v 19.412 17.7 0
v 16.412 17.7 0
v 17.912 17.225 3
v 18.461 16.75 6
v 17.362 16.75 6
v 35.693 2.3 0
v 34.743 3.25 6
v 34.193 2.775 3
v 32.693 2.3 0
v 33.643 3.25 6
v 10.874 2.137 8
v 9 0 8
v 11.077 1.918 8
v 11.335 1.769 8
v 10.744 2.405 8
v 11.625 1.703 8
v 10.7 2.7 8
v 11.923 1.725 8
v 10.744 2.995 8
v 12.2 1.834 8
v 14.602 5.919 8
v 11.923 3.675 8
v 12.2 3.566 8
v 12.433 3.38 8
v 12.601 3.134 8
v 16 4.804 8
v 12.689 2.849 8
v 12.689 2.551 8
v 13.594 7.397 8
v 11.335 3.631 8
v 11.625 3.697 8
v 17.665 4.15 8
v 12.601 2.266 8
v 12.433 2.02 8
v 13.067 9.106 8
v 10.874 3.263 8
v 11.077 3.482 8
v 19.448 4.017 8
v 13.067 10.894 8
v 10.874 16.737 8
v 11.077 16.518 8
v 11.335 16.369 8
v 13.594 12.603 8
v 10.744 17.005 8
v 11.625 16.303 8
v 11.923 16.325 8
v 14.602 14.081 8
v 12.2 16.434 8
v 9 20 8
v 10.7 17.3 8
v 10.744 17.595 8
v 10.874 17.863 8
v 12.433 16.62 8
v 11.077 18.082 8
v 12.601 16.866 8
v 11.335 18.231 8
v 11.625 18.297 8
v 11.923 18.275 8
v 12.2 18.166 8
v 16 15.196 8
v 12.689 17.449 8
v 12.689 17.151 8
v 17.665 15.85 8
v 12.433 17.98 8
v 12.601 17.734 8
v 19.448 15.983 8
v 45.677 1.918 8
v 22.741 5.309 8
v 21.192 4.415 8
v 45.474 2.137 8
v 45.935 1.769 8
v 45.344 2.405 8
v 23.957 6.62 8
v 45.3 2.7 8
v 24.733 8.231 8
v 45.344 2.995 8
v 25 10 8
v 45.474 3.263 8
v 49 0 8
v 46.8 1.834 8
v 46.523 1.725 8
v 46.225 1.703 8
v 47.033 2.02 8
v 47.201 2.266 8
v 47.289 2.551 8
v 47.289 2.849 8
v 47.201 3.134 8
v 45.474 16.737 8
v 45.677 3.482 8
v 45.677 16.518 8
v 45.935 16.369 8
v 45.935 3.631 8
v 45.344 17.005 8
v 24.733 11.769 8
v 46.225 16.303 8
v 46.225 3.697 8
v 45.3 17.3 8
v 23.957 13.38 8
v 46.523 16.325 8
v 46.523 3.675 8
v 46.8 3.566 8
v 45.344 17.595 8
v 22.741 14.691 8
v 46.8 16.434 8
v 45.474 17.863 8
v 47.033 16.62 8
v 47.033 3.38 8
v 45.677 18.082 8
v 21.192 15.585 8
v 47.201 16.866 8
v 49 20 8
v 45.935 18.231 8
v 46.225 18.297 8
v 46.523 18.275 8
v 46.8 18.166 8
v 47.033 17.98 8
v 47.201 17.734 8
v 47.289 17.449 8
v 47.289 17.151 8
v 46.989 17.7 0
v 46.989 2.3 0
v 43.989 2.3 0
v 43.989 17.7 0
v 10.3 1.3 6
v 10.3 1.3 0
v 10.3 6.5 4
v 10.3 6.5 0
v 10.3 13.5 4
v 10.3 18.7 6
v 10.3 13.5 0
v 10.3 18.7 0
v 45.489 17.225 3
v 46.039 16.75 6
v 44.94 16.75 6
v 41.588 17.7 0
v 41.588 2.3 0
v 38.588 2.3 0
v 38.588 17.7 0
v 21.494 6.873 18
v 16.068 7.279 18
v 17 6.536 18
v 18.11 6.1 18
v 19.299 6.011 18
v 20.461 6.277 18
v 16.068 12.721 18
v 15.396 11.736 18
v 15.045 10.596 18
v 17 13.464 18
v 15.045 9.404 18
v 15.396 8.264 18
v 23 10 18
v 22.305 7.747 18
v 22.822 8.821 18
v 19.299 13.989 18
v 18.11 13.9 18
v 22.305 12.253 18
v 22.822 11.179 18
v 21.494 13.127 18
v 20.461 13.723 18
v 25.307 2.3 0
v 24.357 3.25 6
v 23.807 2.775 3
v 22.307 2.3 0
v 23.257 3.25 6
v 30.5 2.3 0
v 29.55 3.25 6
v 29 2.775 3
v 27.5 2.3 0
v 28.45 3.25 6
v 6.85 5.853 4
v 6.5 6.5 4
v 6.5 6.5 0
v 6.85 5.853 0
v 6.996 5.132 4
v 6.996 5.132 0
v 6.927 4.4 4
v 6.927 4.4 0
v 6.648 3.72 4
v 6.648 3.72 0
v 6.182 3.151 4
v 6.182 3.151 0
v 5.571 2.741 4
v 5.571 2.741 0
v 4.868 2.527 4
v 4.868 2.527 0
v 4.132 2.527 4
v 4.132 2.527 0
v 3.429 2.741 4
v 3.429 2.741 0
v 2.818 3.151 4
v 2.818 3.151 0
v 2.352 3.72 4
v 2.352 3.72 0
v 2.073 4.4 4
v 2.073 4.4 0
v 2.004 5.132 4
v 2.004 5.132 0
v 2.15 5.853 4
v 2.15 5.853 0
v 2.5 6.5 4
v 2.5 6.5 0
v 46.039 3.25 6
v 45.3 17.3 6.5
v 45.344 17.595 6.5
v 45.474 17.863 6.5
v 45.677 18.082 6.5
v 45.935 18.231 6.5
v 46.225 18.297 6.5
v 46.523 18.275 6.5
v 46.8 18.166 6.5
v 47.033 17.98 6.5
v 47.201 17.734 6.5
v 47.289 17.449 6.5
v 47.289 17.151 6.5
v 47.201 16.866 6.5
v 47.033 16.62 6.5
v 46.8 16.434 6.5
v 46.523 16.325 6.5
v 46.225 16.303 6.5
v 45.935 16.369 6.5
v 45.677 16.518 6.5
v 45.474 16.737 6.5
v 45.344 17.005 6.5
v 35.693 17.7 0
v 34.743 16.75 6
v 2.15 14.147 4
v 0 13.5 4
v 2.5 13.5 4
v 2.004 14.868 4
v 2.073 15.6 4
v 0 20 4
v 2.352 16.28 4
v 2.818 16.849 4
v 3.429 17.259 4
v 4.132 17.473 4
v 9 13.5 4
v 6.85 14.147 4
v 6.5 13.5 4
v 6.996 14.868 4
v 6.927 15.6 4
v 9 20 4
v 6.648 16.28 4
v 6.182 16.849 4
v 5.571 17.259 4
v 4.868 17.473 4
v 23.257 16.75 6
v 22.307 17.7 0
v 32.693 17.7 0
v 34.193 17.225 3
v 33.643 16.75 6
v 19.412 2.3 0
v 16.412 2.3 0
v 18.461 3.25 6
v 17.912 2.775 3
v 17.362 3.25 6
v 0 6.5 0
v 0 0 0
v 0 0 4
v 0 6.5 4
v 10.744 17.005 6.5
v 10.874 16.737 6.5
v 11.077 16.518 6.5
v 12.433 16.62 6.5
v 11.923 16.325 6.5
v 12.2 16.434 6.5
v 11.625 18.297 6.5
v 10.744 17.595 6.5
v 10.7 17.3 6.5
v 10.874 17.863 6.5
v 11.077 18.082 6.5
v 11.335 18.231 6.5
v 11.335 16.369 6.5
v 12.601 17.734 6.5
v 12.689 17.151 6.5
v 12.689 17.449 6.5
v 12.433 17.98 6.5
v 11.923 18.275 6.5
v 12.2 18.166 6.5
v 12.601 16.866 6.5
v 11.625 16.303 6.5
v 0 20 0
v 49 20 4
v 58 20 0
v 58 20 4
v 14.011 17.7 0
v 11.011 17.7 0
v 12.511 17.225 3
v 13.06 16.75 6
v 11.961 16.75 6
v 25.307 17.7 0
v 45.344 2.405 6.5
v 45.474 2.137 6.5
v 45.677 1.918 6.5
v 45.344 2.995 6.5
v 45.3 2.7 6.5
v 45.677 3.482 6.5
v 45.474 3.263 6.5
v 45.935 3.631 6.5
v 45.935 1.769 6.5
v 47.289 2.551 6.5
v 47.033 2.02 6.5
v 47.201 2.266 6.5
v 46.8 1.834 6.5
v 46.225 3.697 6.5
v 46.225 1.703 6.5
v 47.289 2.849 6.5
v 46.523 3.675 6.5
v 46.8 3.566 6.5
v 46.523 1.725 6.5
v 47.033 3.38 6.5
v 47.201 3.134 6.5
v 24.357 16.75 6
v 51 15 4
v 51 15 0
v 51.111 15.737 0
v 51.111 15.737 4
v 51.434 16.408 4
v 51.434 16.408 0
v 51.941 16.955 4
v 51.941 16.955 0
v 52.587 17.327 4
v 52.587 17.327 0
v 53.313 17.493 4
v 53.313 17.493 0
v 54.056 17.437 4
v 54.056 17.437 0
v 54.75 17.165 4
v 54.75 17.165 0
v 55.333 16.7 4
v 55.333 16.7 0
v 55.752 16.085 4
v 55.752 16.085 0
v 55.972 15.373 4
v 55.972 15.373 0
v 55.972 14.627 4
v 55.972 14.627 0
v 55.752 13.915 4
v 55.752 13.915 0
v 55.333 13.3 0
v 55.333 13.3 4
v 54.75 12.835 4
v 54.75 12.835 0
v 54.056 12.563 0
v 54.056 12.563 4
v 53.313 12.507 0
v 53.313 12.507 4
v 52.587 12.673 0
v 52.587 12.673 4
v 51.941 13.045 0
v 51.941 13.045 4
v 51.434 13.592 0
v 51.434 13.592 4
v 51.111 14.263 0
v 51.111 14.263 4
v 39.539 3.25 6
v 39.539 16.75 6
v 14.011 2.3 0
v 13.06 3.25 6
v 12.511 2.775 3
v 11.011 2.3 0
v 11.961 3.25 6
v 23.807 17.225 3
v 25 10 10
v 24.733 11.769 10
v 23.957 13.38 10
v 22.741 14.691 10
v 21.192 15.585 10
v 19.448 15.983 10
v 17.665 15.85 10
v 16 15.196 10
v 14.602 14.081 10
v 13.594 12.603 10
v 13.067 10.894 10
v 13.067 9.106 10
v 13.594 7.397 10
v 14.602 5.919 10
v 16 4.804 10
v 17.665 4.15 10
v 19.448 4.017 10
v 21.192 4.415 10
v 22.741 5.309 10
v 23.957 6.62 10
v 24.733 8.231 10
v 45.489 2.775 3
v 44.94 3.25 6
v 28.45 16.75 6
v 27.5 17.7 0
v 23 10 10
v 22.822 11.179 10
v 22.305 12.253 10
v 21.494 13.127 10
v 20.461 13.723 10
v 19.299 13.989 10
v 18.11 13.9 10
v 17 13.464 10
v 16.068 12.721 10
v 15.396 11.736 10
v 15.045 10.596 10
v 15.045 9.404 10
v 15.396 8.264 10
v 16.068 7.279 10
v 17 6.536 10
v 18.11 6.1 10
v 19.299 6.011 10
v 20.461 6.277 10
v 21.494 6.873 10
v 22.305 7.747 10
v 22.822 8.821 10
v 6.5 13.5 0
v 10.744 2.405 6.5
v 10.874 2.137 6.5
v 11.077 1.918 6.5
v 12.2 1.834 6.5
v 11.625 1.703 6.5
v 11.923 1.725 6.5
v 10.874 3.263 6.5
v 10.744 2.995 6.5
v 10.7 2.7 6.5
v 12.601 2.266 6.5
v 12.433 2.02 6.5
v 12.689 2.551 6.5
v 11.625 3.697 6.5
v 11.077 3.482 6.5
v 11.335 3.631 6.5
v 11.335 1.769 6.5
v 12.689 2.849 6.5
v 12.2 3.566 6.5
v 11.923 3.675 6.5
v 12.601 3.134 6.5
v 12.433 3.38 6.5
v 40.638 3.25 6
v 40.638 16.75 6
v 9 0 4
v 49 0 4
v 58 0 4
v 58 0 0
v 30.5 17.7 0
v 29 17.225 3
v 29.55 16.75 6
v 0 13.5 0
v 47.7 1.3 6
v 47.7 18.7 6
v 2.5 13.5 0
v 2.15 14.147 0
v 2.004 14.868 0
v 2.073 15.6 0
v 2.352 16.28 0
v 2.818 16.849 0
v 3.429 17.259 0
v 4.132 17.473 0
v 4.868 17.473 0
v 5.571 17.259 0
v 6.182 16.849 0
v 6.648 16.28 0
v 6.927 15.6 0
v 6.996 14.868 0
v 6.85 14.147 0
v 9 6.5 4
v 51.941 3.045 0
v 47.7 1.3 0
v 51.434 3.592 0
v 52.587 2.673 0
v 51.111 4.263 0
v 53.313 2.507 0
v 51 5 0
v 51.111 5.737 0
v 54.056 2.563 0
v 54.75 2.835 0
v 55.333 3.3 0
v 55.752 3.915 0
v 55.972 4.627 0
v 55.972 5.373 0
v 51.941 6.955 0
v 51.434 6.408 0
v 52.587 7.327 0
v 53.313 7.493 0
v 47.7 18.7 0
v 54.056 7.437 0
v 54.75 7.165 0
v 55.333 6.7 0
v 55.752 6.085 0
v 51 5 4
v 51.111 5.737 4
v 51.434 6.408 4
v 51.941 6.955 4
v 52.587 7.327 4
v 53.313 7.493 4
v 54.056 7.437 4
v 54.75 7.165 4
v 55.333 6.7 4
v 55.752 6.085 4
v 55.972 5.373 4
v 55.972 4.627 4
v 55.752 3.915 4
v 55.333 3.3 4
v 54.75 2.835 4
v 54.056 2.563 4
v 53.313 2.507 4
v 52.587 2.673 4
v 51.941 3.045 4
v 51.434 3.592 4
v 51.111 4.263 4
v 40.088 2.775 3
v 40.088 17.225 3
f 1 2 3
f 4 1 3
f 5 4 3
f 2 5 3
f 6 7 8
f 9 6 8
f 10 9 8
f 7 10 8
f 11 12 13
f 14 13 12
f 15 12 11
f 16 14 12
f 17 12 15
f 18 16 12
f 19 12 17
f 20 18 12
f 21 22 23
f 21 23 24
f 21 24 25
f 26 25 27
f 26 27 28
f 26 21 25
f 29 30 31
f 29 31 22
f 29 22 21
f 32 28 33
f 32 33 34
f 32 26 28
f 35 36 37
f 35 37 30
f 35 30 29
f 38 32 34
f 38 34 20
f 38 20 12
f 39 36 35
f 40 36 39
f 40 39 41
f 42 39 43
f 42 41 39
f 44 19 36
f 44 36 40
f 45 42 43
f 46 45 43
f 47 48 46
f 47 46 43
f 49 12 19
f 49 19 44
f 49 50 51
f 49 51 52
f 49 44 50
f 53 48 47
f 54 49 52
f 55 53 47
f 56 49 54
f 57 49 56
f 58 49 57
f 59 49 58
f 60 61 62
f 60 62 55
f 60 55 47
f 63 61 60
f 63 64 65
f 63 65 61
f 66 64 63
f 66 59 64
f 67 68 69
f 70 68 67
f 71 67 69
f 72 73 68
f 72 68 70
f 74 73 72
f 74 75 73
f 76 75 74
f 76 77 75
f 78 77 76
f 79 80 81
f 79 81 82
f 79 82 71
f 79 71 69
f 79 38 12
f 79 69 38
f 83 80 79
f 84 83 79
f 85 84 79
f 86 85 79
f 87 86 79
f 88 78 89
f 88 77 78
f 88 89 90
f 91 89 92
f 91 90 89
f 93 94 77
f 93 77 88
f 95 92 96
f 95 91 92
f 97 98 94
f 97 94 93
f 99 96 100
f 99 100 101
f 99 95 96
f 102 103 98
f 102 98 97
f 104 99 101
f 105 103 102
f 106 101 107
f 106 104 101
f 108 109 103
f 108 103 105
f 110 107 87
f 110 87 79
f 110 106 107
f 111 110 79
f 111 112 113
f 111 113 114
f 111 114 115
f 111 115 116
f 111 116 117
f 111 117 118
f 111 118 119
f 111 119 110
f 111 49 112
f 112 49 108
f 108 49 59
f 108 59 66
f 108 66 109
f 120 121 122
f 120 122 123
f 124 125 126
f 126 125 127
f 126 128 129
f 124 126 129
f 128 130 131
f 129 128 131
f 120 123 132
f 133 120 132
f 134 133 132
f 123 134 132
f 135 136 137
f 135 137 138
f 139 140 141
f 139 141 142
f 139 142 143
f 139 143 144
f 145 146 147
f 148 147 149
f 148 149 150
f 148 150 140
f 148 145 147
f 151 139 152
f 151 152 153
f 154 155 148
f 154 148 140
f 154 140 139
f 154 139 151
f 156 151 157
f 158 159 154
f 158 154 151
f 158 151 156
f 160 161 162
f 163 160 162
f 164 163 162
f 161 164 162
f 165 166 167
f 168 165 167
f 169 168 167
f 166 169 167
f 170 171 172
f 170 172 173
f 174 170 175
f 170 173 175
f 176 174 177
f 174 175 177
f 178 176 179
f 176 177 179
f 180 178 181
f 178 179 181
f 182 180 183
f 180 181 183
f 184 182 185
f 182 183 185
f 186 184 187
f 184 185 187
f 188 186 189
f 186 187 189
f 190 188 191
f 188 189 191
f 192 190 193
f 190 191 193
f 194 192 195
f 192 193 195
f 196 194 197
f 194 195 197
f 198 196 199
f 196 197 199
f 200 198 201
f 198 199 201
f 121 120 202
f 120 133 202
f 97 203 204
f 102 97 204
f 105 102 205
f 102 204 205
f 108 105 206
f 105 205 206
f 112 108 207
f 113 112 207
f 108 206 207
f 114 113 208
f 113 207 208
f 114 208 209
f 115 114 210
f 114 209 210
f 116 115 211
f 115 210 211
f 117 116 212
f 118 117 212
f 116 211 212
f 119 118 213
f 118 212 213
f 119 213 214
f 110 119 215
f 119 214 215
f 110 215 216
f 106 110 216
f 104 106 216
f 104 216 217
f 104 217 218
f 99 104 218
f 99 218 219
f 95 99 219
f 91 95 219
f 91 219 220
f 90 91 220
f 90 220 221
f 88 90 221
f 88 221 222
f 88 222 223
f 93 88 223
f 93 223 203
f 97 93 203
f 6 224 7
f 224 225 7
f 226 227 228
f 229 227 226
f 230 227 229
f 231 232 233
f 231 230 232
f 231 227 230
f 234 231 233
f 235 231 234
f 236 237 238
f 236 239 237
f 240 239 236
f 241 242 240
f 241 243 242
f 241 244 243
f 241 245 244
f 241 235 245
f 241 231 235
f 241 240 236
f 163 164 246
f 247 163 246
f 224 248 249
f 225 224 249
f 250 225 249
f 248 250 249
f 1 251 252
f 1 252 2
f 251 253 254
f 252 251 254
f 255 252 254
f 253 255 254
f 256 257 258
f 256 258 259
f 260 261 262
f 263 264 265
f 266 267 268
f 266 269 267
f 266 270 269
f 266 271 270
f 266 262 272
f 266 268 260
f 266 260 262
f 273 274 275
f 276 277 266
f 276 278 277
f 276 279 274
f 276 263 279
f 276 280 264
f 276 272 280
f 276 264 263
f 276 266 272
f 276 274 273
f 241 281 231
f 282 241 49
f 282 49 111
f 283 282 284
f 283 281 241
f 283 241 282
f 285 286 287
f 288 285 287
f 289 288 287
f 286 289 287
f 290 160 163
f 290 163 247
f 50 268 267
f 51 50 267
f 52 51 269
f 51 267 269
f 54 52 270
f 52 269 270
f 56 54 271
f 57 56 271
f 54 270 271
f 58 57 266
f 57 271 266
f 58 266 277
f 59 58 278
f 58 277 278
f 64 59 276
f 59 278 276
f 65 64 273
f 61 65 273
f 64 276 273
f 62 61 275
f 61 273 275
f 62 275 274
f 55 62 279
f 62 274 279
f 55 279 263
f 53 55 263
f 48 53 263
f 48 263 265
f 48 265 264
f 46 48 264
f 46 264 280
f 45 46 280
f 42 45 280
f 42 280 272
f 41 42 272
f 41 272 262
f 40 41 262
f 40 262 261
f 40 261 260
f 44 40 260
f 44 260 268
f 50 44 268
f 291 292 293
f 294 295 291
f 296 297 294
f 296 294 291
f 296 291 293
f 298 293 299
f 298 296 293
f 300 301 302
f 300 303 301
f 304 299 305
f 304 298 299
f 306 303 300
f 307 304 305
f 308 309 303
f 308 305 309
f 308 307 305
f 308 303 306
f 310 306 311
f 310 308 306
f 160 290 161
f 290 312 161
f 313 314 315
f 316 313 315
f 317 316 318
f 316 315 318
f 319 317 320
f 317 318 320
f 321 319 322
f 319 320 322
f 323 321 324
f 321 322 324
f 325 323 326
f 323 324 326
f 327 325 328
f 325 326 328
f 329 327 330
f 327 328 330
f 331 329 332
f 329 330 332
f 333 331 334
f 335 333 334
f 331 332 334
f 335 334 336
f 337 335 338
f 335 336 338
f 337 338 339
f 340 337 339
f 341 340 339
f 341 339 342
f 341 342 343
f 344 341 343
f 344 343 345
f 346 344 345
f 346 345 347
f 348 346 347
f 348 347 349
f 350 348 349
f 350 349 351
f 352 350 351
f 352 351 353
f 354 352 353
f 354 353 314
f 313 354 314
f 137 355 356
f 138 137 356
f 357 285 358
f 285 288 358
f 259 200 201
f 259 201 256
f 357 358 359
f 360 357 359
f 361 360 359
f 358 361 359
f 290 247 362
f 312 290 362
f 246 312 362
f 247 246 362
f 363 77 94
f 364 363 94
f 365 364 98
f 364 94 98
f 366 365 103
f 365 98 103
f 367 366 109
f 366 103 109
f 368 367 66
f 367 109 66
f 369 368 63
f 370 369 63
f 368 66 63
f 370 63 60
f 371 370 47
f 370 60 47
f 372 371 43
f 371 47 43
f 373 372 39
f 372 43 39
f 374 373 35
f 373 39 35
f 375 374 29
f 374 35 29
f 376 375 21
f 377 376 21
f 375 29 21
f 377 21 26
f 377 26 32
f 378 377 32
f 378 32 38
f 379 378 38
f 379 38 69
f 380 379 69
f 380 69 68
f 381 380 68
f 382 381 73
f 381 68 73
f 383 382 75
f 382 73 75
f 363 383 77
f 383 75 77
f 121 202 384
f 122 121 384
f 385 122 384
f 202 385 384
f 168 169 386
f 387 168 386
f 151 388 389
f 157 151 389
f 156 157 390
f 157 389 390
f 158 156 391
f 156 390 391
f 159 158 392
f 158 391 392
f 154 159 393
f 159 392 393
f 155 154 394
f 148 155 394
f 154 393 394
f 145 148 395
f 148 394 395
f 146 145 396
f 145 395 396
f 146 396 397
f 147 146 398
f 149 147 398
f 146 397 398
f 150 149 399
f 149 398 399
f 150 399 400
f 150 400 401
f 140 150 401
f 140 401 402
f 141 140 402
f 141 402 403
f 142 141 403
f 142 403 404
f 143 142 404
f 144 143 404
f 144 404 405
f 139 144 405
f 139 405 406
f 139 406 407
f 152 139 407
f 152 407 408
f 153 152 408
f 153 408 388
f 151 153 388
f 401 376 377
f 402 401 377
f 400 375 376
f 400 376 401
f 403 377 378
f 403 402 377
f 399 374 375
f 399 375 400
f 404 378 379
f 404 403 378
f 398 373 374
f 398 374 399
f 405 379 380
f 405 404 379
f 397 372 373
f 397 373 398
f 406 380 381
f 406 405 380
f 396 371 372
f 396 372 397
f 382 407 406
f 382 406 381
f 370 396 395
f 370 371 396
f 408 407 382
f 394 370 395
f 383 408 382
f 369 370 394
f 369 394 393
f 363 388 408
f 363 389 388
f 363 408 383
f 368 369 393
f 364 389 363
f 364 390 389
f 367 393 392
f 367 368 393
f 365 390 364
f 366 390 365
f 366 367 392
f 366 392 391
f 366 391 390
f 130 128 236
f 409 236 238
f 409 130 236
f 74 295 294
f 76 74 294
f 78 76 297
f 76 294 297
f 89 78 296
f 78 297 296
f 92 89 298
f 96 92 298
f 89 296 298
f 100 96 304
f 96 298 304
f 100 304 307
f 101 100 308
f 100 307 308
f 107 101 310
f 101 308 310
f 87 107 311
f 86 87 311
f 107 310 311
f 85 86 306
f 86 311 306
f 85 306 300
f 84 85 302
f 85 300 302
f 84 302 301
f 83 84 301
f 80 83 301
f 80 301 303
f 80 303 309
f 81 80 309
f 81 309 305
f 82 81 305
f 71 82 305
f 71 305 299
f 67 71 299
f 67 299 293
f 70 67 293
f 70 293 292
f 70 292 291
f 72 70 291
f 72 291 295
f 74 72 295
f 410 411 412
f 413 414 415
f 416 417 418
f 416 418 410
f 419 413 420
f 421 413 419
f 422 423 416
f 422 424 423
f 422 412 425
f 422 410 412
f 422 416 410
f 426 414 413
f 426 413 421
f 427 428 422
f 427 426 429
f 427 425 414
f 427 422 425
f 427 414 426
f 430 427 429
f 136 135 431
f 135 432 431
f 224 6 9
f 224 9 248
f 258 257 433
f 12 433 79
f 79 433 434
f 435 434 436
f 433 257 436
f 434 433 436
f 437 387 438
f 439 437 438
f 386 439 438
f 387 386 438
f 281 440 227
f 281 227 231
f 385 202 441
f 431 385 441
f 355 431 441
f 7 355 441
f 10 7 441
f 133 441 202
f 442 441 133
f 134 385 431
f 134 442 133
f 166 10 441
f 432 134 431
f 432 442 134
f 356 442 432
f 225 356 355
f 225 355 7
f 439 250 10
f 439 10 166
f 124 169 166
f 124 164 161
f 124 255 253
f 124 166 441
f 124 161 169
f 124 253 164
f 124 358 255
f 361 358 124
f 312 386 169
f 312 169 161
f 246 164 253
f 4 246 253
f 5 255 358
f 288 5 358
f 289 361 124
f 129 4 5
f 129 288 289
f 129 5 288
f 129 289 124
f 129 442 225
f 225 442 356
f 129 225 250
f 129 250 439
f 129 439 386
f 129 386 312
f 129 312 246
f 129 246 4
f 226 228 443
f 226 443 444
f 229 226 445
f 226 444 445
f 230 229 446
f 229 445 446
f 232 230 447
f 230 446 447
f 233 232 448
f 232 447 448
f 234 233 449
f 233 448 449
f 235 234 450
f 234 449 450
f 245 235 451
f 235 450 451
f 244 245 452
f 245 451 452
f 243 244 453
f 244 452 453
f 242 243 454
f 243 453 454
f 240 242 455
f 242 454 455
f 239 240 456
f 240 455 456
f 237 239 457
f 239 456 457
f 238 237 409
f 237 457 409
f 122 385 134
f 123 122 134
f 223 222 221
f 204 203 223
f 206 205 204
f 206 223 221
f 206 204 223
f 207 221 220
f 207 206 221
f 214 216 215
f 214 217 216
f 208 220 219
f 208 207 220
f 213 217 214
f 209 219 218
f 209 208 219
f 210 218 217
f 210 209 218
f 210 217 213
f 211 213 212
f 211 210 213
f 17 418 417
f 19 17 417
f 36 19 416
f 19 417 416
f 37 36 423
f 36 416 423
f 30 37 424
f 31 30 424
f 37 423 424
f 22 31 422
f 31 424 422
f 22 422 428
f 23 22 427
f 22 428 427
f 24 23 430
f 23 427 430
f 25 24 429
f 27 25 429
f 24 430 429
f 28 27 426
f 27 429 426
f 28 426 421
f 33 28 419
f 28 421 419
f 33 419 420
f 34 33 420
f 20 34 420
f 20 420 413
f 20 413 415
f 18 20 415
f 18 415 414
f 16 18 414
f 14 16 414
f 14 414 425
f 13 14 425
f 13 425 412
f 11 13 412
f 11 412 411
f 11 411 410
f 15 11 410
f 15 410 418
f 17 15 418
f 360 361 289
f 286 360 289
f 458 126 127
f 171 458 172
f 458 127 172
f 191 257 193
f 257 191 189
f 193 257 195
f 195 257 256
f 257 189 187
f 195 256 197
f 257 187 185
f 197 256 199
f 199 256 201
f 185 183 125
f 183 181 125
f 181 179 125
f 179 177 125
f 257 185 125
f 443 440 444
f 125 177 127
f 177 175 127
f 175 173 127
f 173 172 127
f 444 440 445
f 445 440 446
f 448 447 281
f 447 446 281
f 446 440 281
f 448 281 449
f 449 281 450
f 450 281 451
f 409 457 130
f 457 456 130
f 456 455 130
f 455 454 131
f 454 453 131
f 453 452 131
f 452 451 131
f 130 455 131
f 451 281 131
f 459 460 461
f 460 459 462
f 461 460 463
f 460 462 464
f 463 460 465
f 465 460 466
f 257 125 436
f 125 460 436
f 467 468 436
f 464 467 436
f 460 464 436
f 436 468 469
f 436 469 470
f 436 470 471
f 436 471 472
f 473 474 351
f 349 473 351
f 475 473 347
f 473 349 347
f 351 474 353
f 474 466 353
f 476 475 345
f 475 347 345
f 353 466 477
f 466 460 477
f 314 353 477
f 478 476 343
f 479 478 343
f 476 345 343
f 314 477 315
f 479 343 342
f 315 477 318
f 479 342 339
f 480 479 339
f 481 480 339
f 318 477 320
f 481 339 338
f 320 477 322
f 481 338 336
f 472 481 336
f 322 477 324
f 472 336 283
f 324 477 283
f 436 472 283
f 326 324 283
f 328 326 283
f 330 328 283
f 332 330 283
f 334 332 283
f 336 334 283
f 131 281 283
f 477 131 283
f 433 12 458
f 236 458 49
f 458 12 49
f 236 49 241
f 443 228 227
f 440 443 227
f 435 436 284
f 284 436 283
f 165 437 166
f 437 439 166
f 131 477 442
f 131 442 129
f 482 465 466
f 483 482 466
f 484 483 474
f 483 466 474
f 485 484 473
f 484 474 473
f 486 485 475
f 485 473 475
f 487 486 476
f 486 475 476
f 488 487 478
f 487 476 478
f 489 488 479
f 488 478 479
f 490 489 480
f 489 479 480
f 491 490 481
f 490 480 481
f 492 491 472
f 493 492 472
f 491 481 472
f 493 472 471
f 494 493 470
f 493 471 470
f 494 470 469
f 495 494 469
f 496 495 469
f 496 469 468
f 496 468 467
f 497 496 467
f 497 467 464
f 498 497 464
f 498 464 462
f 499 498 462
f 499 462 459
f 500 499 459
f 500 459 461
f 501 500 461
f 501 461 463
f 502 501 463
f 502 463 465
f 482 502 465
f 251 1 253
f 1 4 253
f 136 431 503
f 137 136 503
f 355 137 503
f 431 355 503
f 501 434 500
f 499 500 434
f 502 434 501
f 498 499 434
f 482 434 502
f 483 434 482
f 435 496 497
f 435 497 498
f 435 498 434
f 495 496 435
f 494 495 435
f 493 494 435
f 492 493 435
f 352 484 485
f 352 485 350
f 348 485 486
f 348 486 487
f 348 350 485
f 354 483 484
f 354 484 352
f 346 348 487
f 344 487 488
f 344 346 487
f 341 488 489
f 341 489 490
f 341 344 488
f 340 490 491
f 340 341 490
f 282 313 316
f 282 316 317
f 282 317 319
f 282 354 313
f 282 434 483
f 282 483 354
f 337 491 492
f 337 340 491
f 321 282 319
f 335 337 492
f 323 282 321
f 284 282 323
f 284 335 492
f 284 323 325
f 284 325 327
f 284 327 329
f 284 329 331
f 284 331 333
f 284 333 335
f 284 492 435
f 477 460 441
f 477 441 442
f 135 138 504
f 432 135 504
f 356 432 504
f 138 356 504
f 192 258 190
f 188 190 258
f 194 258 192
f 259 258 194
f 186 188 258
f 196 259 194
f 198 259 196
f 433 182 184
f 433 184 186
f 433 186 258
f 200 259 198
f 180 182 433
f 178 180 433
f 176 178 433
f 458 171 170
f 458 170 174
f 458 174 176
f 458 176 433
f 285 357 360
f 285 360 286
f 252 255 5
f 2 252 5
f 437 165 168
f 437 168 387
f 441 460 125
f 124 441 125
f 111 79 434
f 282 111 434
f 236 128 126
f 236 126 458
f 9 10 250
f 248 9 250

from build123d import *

# Parameters (mm, degrees)
ESQUISSE1_W             = 58
ESQUISSE1_H             = 20
EXTRUSION1_DEPTH        = 8
ESQUISSE2_W             = 37.4
ESQUISSE2_H             = 17.4
ENL_V_MAT_EXTRU_1_DEPTH = 6
ESQUISSE3_W             = 9
ESQUISSE3_H             = 4
ENL_V_MAT_EXTRU_2_DEPTH = 21
ESQUISSE4_R             = 2.5
ESQUISSE4_R_2           = 1
ENL_V_MAT_EXTRU_3_DEPTH = 9
ESQUISSE5_R             = 4
EXTRUSION2_DEPTH        = 10
ESQUISSE6_W             = 10.3
ESQUISSE6_H             = 7
ENL_V_MAT_EXTRU_4_DEPTH = 4
ESQUISSE10_W            = 37.4
ESQUISSE10_H            = 0.5
EXTRUSION8_DEPTH        = 20
ESQUISSE8_W             = 3
ESQUISSE8_H             = 15.4
EXTRUSION7_DEPTH        = 6.5
EXTRUSION7_TAPER        = 9
ESQUISSE11_R            = 6
EXTRUSION9_DEPTH        = 2


with BuildPart() as part:
    # Esquisse1 → Extrusion1 (new body)
    with BuildSketch(Plane.XY):
        with Locations((29, 10)):
            Rectangle(ESQUISSE1_W, ESQUISSE1_H)
    extrude(amount=EXTRUSION1_DEPTH)

    # Esquisse2 → Enlèv. mat.-Extru.1 (cut)
    with BuildSketch(Plane(origin=(0, 0, 0), x_dir=(-1, 0, 0), z_dir=(0, 0, -1))):
        with Locations((-29, 10)):
            Rectangle(ESQUISSE2_W, ESQUISSE2_H)
    extrude(amount=-ENL_V_MAT_EXTRU_1_DEPTH, mode=Mode.SUBTRACT)

    # Esquisse3 → Enlèv. mat.-Extru.2 (cut, through all)
    with BuildSketch(Plane(origin=(0, 20, 0), x_dir=(1, 0, 0), z_dir=(0, 1, 0))):
        with Locations((4.5, -6)):
            Rectangle(ESQUISSE3_W, ESQUISSE3_H)
        with Locations((53.5, -6)):
            Rectangle(ESQUISSE3_W, ESQUISSE3_H)
    extrude(amount=-ENL_V_MAT_EXTRU_2_DEPTH, mode=Mode.SUBTRACT)

    # Esquisse4 → Enlèv. mat.-Extru.3 (cut, through all)
    with BuildSketch(Plane(origin=(0, 0, 0), x_dir=(-1, 0, 0), z_dir=(0, 0, -1))):
        with Locations((-53.5, 15)):
            Circle(ESQUISSE4_R)
        with Locations((-46.3, 17.3)):
            Circle(ESQUISSE4_R_2)
        with Locations((-46.3, 2.7)):
            Circle(ESQUISSE4_R_2)
        with Locations((-53.5, 5)):
            Circle(ESQUISSE4_R)
        with Locations((-4.5, 5)):
            Circle(ESQUISSE4_R)
        with Locations((-11.7, 2.7)):
            Circle(ESQUISSE4_R_2)
        with Locations((-11.7, 17.3)):
            Circle(ESQUISSE4_R_2)
        with Locations((-4.5, 15)):
            Circle(ESQUISSE4_R)
    extrude(amount=-ENL_V_MAT_EXTRU_3_DEPTH, mode=Mode.SUBTRACT)

    # Esquisse5 → Extrusion2 (add)
    with BuildSketch(Plane.XY.offset(8)):
        with Locations((19, 10)):
            Circle(ESQUISSE5_R)
    extrude(amount=EXTRUSION2_DEPTH)

    # Esquisse6 → Enlèv. mat.-Extru.4 (cut)
    with BuildSketch(Plane(origin=(0, 0, 0), x_dir=(-1, 0, 0), z_dir=(0, 0, -1))):
        with Locations((-5.15, 10)):
            Rectangle(ESQUISSE6_W, ESQUISSE6_H)
    extrude(amount=-ENL_V_MAT_EXTRU_4_DEPTH, mode=Mode.SUBTRACT)

    # Esquisse10 → Extrusion8 (add)
    with BuildSketch(Plane(origin=(0, 20, 0), x_dir=(1, 0, 0), z_dir=(0, 1, 0))):
        with Locations((29, -6.25)):
            Rectangle(ESQUISSE10_W, ESQUISSE10_H)
    extrude(amount=-EXTRUSION8_DEPTH)

    # Esquisse8 → Extrusion7 (add)
    with BuildSketch(Plane(origin=(0, 0, 0), x_dir=(-1, 0, 0), z_dir=(0, 0, -1))):
        with Locations((-23.806848388, 10)):
            Rectangle(ESQUISSE8_W, ESQUISSE8_H)
        with Locations((-45.489222367, 10)):
            Rectangle(ESQUISSE8_W, ESQUISSE8_H)
        with Locations((-40.088484526, 10)):
            Rectangle(ESQUISSE8_W, ESQUISSE8_H)
        with Locations((-34.193151612, 10)):
            Rectangle(ESQUISSE8_W, ESQUISSE8_H)
        with Locations((-29, 10)):
            Rectangle(ESQUISSE8_W, ESQUISSE8_H)
        with Locations((-17.911515474, 10)):
            Rectangle(ESQUISSE8_W, ESQUISSE8_H)
        with Locations((-12.510777633, 10)):
            Rectangle(ESQUISSE8_W, ESQUISSE8_H)
    extrude(amount=-EXTRUSION7_DEPTH, taper=EXTRUSION7_TAPER)

    # Esquisse11 → Extrusion9 (add)
    with BuildSketch(Plane.XY.offset(8)):
        with Locations((19, 10)):
            Circle(ESQUISSE11_R)
    extrude(amount=EXTRUSION9_DEPTH)


solid = part.part
